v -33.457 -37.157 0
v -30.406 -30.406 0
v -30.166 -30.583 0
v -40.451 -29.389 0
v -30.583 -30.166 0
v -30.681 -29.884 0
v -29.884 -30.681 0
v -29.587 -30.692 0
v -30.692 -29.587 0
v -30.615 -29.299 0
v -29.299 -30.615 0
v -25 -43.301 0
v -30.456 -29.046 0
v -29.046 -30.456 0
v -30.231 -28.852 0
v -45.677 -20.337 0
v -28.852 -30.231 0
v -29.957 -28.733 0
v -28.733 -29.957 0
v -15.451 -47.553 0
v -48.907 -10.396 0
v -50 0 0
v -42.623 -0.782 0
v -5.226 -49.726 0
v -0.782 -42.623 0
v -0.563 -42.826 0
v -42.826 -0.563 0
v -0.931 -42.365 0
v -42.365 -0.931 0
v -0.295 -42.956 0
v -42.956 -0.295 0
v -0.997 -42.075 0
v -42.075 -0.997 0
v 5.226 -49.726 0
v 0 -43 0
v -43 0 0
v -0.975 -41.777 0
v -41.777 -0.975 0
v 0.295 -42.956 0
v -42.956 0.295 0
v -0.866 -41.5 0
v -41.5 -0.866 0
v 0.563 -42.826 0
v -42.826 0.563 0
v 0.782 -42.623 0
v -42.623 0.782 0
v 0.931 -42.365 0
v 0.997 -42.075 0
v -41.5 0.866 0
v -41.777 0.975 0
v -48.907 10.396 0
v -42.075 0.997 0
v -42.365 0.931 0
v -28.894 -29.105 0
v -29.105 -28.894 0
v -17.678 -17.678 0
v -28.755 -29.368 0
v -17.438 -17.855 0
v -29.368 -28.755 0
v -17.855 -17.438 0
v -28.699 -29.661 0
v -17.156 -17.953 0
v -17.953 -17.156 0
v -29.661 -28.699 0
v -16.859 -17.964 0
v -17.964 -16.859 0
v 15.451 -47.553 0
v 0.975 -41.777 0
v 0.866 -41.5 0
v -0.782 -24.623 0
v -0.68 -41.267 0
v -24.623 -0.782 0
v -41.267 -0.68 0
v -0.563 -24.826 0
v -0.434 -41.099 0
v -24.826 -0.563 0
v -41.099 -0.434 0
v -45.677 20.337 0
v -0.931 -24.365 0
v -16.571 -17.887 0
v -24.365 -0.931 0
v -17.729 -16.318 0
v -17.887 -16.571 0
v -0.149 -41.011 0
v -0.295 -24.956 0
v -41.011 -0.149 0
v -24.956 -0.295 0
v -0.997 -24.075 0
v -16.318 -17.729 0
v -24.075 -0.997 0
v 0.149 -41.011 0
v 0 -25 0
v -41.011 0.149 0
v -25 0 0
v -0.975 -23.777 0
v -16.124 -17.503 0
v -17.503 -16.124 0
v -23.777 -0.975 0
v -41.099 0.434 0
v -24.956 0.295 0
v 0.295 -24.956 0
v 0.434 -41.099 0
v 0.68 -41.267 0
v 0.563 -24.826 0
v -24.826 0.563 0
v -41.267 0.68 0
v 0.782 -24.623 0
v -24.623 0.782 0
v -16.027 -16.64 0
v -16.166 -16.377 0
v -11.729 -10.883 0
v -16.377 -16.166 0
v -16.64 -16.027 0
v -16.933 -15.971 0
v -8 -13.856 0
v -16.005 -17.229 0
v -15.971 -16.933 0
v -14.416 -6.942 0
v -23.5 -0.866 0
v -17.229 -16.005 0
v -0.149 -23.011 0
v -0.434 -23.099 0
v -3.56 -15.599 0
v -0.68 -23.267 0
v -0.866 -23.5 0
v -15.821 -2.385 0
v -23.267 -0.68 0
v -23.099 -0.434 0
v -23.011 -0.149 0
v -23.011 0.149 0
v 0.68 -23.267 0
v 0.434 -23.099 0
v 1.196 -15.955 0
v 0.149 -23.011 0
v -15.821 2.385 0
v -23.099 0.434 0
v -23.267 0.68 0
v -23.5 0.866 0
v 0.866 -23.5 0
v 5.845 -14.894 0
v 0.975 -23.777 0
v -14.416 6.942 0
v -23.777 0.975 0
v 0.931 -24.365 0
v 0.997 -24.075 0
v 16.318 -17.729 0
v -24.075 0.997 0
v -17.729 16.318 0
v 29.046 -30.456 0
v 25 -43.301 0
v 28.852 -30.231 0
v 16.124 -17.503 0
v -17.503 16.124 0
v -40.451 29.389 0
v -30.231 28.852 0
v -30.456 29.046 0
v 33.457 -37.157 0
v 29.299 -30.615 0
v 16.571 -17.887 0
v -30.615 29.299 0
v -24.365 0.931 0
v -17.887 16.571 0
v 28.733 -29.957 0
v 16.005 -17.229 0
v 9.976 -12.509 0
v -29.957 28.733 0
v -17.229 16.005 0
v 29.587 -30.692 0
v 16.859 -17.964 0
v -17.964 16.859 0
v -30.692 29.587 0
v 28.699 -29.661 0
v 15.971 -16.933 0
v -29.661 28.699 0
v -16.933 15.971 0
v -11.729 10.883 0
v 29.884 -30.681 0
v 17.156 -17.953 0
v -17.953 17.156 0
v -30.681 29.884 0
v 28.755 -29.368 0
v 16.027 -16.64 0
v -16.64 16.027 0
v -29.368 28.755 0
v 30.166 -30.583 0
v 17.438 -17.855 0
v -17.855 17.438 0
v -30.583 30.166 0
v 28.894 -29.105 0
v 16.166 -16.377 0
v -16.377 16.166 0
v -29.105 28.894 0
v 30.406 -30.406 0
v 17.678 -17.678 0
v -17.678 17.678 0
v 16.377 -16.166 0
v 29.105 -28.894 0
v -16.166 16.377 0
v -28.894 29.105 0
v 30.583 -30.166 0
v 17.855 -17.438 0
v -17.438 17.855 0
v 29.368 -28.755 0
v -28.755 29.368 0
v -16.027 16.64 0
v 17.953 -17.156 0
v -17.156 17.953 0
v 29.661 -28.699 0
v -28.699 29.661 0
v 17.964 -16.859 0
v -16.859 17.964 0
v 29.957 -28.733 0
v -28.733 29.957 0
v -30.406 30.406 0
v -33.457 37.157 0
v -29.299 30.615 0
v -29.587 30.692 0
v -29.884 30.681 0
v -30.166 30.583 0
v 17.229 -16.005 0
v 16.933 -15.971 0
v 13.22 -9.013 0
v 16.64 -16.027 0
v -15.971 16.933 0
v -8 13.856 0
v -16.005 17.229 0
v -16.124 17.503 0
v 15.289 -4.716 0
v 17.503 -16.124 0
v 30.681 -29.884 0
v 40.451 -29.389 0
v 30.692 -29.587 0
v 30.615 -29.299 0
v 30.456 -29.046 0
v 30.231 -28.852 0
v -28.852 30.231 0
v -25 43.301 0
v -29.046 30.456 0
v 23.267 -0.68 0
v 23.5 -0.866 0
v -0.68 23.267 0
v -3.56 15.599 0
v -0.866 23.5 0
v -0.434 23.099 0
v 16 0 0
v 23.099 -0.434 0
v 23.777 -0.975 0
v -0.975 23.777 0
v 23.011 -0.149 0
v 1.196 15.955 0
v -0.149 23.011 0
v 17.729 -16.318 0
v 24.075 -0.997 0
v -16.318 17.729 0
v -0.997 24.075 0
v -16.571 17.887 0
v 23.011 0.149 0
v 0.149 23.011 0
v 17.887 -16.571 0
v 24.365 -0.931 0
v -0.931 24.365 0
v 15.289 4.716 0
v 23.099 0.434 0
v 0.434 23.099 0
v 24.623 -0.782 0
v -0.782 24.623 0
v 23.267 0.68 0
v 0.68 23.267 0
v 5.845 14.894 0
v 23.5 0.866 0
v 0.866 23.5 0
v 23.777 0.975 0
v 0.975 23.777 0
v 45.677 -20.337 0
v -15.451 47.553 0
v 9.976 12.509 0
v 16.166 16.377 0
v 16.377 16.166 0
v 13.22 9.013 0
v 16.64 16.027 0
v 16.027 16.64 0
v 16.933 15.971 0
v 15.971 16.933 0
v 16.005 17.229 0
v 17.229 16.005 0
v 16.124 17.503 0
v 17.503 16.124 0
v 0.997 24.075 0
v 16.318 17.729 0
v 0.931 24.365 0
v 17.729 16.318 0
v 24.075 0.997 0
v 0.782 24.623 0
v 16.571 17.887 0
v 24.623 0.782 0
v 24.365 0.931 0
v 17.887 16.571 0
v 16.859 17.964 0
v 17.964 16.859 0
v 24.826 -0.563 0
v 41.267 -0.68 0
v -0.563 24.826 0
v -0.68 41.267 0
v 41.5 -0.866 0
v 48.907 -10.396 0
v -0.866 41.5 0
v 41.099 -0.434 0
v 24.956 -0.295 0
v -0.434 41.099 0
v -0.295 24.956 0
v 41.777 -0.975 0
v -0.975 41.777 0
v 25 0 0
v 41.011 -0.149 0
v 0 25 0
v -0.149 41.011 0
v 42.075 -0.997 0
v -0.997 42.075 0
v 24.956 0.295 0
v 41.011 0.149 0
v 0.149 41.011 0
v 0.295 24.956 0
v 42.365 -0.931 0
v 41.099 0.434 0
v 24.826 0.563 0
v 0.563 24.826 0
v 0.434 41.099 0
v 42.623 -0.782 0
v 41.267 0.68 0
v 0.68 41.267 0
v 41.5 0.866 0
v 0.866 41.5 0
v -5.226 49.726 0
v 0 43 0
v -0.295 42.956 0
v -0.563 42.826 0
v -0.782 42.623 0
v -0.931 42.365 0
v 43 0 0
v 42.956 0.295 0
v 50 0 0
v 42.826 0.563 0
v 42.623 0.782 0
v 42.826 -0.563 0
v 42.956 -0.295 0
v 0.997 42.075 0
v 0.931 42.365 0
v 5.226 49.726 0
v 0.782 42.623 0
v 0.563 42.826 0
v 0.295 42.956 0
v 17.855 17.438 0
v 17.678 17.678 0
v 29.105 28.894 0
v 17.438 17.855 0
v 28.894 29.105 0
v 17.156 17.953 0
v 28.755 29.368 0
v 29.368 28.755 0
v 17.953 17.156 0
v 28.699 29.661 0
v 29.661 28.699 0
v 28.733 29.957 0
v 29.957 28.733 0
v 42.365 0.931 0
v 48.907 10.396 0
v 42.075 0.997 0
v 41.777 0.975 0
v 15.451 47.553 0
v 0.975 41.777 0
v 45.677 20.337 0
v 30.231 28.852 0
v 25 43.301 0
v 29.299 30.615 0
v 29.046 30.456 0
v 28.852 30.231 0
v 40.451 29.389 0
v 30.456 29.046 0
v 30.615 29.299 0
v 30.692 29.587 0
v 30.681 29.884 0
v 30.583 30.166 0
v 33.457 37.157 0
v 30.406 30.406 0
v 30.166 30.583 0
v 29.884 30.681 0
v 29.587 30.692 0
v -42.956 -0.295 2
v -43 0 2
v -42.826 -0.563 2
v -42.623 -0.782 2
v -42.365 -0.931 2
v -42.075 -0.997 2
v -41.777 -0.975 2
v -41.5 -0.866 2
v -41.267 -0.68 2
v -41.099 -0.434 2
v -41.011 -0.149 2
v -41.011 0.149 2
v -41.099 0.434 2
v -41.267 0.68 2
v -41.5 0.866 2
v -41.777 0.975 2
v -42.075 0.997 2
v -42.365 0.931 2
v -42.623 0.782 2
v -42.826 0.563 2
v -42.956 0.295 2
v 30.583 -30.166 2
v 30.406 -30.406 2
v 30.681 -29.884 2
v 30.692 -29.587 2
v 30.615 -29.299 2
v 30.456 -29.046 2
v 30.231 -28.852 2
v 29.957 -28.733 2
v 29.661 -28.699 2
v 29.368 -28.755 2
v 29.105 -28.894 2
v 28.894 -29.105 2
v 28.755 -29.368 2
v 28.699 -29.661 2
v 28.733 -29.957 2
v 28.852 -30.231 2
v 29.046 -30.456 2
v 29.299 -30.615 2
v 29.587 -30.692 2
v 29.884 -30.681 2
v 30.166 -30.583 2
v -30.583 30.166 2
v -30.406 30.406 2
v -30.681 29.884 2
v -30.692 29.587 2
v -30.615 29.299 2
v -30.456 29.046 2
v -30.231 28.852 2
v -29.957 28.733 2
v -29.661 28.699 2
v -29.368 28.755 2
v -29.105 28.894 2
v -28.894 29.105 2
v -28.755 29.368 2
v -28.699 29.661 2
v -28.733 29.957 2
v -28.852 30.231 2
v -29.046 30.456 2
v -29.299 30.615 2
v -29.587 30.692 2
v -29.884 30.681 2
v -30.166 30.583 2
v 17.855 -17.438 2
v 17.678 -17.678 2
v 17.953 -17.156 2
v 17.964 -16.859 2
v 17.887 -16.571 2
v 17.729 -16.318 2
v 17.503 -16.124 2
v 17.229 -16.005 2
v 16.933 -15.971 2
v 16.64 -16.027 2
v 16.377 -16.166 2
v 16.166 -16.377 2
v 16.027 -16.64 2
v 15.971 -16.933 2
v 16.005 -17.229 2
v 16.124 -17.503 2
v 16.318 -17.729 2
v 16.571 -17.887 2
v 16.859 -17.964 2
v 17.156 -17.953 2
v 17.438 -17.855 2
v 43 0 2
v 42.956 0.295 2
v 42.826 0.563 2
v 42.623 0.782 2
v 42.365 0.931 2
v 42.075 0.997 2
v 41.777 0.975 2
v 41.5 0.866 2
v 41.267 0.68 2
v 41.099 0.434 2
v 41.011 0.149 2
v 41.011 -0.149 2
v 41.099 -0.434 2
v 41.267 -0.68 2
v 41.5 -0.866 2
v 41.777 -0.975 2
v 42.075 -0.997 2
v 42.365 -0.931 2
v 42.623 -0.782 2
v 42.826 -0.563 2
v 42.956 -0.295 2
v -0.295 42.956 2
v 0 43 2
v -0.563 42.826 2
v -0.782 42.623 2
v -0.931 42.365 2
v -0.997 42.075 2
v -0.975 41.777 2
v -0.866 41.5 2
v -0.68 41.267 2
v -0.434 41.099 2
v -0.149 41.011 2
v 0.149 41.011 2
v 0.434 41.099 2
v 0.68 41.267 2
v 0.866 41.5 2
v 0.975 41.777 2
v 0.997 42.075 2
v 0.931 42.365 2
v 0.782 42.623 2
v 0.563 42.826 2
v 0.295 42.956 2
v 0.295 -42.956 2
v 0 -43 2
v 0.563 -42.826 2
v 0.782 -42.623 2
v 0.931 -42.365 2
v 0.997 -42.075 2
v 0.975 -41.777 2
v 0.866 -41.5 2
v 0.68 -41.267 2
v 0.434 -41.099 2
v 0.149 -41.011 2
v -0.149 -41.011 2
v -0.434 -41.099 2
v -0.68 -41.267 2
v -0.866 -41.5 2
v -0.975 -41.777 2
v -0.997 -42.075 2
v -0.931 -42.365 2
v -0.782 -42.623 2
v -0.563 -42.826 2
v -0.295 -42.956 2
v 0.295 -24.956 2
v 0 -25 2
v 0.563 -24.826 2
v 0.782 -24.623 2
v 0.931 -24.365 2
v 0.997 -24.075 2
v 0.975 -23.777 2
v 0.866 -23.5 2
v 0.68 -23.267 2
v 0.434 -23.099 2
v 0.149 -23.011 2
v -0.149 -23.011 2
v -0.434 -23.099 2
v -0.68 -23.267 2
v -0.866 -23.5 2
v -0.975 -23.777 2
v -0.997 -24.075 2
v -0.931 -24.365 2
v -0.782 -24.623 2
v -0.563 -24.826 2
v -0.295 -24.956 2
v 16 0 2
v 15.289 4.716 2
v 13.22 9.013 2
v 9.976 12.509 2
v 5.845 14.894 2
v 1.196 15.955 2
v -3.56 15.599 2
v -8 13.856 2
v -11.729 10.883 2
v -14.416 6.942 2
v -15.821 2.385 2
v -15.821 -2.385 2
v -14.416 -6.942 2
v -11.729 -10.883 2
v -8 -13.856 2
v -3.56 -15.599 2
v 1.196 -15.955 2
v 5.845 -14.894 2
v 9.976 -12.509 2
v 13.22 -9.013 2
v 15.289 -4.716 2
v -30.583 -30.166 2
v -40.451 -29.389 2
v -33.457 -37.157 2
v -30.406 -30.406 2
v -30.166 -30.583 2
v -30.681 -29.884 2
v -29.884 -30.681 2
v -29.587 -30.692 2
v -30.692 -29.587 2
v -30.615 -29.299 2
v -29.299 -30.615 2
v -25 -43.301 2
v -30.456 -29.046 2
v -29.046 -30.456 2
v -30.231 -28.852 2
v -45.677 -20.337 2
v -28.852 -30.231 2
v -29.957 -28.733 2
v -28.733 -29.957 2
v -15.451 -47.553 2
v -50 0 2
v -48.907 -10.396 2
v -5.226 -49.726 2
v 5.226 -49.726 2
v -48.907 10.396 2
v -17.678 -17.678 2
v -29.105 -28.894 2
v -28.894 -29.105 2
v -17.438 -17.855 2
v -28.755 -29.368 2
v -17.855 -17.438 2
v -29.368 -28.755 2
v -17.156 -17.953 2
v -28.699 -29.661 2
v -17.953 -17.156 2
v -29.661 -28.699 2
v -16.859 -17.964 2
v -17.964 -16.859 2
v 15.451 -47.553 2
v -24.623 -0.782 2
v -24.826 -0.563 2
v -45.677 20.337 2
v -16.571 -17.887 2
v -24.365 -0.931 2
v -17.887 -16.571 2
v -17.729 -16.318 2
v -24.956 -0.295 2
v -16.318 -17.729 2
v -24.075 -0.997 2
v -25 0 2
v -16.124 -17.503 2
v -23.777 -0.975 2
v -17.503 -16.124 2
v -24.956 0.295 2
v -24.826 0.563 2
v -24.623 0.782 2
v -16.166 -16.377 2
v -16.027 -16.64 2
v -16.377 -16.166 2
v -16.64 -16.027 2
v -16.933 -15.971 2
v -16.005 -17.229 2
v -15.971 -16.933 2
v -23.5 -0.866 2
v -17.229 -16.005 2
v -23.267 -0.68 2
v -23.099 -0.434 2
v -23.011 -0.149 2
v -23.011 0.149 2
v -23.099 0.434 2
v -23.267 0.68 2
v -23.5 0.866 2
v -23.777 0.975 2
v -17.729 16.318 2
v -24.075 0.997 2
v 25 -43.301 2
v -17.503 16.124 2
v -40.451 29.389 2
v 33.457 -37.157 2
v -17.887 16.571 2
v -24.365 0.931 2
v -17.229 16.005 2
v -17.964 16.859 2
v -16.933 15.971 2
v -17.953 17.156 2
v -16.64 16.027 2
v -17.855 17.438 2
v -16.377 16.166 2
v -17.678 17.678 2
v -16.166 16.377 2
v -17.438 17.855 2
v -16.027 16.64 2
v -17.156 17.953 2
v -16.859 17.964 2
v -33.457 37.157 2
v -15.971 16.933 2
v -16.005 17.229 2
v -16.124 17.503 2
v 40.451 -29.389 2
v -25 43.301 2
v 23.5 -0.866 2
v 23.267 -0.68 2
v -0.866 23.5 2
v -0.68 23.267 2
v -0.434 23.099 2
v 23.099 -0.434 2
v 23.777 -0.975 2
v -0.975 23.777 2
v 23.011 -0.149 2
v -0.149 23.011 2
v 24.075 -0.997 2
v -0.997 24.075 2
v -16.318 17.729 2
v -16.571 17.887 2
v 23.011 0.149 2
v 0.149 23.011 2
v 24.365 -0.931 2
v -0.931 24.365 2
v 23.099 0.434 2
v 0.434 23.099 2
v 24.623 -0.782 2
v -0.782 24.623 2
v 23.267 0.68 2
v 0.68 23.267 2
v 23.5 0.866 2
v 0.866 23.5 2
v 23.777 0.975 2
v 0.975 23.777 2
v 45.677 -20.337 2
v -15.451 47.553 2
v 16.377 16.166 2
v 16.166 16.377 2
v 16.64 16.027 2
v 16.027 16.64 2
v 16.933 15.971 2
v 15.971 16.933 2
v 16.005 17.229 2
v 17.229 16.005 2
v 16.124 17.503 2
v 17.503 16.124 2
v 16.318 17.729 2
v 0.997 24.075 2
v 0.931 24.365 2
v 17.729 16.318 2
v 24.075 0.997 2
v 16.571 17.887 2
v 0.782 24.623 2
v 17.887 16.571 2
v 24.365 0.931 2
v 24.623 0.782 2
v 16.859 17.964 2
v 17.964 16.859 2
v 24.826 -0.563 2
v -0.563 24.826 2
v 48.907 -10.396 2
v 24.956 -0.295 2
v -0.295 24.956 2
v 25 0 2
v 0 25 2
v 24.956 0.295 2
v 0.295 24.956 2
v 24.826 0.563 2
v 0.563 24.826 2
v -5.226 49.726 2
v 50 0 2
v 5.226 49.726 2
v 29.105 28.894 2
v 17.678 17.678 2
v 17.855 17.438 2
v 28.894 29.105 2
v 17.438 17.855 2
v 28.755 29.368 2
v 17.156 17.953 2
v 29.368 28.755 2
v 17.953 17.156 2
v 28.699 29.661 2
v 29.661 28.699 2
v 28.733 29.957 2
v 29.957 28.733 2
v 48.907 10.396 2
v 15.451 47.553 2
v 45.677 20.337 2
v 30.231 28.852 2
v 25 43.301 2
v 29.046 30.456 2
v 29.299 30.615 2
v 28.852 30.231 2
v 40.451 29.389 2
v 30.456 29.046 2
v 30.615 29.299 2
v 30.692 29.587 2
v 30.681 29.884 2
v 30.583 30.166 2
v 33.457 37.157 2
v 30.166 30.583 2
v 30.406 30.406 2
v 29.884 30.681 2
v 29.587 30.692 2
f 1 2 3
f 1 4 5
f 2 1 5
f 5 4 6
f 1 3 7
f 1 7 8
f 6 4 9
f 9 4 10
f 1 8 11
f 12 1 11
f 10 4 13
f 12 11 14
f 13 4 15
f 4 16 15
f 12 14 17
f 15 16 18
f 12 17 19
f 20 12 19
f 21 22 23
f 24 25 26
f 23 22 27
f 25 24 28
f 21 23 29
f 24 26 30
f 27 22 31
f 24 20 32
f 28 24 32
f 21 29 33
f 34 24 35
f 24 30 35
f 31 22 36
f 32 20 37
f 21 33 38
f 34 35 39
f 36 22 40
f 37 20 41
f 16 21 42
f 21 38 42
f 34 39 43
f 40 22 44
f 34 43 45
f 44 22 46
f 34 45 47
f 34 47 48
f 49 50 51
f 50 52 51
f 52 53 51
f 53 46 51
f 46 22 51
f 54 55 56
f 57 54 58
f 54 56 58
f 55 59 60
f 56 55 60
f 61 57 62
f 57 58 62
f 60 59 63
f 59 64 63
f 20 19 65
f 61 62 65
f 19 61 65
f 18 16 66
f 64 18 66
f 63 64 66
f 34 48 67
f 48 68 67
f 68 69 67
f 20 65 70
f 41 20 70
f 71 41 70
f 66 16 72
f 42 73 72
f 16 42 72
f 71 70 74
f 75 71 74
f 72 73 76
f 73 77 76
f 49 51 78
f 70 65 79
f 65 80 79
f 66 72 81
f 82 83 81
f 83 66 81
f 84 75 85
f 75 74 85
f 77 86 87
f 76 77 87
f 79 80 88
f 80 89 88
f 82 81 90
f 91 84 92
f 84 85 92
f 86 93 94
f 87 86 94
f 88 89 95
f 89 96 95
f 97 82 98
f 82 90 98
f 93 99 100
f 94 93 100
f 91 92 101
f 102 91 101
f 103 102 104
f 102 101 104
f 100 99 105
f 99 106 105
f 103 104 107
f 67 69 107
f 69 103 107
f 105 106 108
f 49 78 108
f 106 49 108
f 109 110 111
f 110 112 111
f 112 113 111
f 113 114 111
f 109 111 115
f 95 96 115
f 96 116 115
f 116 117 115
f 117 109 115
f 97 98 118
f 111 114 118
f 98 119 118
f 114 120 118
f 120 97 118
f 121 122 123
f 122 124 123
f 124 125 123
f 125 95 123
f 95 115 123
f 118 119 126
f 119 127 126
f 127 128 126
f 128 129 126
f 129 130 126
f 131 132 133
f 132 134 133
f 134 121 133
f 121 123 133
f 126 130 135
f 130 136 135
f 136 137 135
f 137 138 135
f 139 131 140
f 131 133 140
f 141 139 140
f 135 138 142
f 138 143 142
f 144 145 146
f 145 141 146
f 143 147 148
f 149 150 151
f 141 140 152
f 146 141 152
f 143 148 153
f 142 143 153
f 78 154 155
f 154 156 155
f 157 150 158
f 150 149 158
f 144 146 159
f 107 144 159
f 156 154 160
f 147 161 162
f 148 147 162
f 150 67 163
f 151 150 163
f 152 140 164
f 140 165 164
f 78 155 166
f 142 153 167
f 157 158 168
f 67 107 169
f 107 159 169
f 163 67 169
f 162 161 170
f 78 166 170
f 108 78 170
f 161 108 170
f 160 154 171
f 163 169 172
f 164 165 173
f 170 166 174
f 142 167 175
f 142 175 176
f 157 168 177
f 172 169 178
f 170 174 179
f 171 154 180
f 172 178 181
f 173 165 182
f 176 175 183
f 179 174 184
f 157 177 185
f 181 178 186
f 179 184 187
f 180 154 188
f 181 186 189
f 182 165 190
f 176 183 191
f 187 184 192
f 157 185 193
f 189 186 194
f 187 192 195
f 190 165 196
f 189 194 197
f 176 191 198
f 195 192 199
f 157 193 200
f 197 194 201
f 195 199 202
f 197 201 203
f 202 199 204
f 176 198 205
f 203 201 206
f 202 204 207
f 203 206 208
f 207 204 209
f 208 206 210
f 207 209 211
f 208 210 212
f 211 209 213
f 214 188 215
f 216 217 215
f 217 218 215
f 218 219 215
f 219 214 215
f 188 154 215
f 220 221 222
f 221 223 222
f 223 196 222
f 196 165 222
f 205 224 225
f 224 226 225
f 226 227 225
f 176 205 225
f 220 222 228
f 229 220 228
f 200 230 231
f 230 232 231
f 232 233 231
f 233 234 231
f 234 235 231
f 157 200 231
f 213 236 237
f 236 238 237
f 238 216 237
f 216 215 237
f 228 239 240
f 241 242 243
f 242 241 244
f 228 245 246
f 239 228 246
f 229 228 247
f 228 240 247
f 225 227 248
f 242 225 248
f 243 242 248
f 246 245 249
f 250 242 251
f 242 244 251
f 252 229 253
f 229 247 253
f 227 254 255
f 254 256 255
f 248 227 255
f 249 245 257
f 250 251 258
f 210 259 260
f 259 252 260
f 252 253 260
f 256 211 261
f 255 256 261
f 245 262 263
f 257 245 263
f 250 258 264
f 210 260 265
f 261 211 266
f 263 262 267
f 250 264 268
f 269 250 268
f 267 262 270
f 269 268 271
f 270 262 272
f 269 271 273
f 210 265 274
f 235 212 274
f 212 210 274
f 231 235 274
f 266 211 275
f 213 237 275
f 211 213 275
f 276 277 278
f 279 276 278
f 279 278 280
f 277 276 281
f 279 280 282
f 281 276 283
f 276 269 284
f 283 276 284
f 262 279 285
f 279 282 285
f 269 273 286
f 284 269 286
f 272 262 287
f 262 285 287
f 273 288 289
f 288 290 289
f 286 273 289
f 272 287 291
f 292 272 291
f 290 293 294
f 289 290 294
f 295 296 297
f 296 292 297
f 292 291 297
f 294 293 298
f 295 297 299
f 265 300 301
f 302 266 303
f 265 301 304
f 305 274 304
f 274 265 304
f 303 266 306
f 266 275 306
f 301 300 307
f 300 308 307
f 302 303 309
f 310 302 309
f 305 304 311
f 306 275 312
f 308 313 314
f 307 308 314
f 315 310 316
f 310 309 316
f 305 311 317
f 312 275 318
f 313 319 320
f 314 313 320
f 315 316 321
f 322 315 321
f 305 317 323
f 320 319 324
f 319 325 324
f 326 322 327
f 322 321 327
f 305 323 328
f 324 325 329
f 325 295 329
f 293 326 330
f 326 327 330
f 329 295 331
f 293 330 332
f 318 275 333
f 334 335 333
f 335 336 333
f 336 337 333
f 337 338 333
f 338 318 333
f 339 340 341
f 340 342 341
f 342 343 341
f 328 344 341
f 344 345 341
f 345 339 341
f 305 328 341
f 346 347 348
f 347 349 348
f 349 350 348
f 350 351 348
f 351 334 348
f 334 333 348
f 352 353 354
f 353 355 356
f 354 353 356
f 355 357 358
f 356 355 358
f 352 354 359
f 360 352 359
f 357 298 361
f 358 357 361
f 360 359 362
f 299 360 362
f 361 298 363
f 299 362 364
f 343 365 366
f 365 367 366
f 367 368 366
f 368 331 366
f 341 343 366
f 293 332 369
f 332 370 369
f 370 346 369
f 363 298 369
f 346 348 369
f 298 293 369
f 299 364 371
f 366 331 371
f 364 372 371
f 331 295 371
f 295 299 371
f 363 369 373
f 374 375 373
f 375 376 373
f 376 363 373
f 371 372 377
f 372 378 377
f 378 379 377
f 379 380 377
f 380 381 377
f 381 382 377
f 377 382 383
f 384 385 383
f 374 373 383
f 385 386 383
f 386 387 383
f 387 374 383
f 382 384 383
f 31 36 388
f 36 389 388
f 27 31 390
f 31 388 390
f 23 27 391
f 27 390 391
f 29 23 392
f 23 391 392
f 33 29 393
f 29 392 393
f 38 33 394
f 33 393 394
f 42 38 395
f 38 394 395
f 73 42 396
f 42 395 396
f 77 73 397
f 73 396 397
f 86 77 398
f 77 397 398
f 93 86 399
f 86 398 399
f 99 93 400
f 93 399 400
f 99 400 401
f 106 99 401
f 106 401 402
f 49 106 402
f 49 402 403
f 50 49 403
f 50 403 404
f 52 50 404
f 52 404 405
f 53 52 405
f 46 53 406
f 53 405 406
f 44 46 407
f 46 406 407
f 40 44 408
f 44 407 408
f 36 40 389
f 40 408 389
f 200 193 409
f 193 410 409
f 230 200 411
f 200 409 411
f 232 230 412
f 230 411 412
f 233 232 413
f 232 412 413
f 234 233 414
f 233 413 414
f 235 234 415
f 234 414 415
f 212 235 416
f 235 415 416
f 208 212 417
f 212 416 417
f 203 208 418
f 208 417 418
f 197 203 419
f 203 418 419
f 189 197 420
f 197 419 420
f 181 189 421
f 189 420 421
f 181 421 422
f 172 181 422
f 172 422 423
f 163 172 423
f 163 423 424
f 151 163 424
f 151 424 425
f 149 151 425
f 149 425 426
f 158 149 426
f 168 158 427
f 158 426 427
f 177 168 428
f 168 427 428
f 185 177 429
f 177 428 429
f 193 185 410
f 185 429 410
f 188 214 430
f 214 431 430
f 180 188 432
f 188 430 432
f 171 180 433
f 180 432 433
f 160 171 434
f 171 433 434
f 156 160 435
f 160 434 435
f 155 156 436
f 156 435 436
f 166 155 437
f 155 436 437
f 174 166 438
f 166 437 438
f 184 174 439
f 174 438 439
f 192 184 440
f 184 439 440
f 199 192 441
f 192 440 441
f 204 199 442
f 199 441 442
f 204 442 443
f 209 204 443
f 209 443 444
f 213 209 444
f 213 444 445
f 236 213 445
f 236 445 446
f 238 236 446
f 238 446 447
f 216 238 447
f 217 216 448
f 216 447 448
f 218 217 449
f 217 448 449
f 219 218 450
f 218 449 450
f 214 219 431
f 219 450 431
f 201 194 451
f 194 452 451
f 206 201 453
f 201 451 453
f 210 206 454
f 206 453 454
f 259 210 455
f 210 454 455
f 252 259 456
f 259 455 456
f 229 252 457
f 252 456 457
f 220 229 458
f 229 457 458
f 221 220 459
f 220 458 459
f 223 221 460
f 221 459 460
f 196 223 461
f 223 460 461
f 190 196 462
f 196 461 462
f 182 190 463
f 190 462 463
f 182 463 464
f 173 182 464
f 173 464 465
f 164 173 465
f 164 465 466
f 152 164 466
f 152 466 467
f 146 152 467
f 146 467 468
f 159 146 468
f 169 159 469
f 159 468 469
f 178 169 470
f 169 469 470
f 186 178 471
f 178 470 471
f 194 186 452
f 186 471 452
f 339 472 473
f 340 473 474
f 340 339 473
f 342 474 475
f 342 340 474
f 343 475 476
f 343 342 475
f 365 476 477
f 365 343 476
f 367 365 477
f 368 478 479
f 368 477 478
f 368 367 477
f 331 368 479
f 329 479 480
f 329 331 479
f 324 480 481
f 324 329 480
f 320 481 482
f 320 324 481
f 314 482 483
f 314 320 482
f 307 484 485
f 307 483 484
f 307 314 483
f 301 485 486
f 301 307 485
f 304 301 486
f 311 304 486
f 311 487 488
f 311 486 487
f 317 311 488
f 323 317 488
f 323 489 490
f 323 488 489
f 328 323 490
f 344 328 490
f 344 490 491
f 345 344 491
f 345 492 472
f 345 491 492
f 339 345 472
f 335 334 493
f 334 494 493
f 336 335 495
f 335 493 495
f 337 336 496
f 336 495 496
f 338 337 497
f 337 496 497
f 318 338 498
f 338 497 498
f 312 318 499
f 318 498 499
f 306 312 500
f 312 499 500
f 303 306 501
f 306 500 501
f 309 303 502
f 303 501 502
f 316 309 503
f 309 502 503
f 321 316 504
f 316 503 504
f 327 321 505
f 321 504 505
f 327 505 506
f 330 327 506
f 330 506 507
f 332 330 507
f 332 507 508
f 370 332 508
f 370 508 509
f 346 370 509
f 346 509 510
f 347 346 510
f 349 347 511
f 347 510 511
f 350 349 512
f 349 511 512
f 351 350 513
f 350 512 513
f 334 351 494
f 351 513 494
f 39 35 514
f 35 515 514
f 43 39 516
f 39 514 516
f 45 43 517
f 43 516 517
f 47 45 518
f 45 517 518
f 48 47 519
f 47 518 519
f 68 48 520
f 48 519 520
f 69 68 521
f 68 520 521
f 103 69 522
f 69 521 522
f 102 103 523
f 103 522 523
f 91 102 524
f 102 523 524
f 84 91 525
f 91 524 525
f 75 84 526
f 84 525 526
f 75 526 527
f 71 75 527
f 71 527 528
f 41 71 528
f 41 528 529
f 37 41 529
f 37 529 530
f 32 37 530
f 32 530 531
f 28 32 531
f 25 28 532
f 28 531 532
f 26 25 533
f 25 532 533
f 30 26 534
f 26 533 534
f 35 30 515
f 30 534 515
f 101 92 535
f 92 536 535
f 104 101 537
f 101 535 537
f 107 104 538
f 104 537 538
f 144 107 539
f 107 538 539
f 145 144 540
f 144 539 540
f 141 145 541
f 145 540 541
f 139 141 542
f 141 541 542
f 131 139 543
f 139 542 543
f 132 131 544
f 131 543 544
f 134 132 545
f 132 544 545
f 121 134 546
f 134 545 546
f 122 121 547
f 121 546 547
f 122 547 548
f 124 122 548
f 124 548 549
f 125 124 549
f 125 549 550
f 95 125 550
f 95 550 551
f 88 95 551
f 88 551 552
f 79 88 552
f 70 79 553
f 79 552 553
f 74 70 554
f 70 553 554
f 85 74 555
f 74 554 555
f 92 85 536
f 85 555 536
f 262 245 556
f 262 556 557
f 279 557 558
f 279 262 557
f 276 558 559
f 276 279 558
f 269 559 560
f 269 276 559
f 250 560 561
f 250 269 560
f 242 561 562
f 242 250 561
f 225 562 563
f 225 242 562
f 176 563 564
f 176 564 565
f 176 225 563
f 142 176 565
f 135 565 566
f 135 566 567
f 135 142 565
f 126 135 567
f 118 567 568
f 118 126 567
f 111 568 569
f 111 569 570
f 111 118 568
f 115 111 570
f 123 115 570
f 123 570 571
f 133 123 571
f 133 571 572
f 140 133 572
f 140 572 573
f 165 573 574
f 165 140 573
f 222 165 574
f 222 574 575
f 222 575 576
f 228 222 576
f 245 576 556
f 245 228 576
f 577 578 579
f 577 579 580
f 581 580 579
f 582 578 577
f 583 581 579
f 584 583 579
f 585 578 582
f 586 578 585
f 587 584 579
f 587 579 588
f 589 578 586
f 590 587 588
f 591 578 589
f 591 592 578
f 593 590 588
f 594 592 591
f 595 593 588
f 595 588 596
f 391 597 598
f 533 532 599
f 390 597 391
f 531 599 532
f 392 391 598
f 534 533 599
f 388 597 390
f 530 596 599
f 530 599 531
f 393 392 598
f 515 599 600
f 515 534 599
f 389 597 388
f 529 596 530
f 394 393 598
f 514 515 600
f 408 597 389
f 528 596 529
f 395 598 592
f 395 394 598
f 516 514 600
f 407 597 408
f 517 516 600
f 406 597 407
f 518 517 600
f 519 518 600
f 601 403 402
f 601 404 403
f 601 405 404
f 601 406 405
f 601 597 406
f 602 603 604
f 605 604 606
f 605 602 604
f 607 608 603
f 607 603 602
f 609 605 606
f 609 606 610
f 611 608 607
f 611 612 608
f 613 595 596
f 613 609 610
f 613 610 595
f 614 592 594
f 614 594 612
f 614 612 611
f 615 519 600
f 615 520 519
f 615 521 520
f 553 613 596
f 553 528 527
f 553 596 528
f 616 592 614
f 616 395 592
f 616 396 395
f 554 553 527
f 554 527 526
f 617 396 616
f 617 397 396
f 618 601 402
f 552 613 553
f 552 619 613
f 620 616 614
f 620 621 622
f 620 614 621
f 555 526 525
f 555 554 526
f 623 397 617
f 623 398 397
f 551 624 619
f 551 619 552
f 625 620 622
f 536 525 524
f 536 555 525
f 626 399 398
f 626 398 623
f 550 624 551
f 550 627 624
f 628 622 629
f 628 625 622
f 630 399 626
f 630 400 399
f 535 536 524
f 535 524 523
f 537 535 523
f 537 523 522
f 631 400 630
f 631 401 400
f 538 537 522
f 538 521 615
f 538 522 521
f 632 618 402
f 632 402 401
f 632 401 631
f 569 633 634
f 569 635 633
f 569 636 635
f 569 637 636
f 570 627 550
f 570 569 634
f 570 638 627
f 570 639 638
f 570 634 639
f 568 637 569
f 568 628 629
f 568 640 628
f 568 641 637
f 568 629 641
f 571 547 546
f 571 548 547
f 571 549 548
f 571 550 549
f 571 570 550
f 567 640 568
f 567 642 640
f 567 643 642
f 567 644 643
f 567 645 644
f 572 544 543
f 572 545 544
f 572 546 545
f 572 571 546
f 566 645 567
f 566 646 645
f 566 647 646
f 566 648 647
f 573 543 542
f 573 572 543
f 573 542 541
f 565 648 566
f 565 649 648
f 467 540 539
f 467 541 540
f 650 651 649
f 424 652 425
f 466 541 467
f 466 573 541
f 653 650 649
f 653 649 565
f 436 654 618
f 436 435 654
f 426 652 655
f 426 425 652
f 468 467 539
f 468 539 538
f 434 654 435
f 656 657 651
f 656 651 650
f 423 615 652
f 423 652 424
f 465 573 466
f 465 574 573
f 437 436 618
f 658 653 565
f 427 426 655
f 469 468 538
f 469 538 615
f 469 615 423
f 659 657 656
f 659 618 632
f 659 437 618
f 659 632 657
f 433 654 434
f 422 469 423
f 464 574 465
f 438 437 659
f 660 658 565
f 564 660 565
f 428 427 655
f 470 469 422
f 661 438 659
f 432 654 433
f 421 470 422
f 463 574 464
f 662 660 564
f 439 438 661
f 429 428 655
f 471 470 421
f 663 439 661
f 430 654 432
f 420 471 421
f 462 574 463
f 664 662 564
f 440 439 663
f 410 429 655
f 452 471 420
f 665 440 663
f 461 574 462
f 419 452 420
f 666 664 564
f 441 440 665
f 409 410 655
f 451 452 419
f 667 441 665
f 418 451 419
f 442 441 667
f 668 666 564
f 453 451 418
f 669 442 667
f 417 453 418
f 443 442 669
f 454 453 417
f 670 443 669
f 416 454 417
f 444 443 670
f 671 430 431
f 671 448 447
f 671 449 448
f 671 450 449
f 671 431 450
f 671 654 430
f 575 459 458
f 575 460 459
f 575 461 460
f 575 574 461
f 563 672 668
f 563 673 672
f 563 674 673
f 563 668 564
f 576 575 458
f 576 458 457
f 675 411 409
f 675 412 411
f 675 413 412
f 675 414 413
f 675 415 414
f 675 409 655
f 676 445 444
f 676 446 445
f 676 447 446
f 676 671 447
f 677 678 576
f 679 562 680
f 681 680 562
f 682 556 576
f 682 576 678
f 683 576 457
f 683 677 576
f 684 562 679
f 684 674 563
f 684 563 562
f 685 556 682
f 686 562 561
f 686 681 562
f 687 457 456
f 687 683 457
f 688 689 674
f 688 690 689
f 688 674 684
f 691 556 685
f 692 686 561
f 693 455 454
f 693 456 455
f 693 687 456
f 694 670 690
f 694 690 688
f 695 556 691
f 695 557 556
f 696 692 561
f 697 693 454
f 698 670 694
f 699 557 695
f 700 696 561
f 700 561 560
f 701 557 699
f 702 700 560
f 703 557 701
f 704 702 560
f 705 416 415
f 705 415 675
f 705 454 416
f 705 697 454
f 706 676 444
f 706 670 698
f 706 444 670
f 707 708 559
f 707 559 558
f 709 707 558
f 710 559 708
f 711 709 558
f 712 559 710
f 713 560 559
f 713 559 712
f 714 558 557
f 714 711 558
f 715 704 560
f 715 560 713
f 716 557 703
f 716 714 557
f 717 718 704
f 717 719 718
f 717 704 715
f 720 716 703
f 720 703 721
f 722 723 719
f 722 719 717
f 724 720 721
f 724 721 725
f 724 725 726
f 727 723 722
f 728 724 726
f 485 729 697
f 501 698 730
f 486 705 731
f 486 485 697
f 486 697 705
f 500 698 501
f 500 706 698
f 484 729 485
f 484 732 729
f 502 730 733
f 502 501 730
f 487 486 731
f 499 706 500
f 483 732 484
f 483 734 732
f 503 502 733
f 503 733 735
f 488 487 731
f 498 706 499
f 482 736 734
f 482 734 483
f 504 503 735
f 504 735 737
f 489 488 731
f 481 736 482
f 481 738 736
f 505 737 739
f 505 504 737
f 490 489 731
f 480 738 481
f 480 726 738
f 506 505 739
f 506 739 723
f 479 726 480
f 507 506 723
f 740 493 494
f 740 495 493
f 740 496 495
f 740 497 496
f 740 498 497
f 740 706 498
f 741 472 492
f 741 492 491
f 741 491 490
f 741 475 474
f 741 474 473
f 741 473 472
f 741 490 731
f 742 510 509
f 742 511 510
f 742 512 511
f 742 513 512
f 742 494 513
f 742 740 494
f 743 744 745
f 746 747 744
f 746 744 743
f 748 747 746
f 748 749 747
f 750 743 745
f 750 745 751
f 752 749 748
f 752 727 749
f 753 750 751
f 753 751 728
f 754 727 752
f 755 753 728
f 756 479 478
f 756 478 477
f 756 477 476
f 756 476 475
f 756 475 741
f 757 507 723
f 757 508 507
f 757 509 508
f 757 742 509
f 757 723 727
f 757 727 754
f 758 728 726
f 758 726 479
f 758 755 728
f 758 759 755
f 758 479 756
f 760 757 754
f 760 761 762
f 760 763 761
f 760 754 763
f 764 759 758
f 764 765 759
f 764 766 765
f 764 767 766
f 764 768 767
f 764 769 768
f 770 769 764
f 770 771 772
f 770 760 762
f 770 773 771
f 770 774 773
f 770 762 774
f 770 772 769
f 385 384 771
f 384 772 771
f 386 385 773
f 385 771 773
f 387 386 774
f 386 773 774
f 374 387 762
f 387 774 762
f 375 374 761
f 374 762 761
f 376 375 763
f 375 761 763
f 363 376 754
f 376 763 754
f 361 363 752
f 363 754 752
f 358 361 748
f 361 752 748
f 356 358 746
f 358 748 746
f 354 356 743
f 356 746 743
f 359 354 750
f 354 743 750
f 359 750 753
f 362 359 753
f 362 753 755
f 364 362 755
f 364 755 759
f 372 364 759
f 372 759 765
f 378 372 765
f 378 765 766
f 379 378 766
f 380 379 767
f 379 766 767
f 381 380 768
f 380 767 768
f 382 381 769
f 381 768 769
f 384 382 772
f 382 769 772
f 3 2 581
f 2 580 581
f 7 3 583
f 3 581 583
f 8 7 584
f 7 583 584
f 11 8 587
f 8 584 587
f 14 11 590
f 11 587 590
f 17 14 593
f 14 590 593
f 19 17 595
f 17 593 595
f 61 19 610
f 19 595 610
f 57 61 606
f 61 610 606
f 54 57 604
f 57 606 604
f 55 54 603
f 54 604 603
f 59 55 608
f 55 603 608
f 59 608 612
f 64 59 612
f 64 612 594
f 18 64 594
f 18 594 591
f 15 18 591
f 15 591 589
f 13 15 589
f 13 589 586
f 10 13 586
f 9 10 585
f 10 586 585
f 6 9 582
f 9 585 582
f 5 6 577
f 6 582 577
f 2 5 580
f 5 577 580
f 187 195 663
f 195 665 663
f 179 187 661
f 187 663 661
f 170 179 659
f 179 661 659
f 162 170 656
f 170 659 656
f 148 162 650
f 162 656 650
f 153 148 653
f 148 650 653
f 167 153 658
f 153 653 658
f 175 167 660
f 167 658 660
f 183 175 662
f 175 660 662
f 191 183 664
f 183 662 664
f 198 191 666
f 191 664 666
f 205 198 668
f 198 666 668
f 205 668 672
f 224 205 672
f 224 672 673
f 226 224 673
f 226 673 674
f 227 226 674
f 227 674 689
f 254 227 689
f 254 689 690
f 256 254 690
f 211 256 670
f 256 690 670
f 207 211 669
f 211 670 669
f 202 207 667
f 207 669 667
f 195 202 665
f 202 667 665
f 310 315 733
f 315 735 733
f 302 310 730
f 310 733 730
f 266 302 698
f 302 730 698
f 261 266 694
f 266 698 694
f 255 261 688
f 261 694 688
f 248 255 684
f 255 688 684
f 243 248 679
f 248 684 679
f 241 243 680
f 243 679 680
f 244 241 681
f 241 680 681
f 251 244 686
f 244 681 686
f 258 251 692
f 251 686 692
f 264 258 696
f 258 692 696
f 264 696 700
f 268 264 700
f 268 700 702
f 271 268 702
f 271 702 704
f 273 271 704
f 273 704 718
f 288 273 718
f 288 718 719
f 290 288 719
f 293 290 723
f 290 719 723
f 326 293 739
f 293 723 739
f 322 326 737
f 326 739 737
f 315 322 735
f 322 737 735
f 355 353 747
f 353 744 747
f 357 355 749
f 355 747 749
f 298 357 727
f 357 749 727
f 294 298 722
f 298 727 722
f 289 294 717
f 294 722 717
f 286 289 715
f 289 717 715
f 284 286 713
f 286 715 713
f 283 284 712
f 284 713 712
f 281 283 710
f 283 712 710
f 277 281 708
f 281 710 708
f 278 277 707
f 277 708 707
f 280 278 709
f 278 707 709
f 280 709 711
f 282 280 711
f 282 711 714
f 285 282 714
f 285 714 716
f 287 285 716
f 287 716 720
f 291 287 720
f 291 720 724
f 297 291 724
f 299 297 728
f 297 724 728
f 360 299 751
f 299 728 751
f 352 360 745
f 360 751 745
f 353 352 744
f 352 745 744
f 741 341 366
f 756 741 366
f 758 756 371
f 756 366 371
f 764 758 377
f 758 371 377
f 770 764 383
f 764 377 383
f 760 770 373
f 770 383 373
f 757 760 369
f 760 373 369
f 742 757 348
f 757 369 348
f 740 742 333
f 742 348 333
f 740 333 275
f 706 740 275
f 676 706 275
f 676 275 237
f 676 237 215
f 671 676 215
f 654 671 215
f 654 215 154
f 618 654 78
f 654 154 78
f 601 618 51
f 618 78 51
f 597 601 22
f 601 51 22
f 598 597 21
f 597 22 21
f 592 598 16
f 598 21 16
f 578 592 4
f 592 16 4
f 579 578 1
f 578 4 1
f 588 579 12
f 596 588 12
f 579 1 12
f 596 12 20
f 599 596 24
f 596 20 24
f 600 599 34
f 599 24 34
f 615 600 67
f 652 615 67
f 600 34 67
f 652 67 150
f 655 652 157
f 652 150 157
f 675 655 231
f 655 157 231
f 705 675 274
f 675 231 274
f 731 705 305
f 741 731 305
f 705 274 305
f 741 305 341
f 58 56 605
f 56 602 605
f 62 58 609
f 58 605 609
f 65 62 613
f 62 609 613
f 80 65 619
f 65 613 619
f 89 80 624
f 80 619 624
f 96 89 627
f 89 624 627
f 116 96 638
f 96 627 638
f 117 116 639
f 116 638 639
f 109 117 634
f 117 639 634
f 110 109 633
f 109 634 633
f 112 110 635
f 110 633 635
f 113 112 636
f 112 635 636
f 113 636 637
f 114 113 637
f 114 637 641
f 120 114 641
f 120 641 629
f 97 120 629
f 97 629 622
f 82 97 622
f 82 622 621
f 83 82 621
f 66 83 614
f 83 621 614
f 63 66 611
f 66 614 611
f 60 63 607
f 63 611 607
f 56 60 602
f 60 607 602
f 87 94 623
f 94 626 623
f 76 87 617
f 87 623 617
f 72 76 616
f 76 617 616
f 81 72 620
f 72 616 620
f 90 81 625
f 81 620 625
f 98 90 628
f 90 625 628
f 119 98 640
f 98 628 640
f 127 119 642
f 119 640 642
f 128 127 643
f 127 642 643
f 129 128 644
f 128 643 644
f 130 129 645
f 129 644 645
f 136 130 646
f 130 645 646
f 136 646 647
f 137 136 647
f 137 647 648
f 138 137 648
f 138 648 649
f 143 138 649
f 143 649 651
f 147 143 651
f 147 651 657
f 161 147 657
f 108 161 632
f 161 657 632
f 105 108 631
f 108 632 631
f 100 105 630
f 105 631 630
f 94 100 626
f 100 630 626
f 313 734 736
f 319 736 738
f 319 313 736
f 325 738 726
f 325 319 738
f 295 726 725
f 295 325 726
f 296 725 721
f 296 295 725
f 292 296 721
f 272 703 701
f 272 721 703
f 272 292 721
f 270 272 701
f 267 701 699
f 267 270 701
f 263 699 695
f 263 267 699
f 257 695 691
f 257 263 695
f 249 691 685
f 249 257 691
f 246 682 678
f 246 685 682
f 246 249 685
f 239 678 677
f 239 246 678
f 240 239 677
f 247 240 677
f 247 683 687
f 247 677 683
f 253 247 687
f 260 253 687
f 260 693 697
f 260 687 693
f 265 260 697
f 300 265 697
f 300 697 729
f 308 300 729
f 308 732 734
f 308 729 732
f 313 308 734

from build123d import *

# Parameters (mm, degrees)
SKETCH_R           = 50
SKETCH_R_2         = 16
PAD_DEPTH          = 2
SKETCH001_R        = 1
POCKET_DEPTH       = 282.871995
POCKET_DEPTH_BACK  = 284.871995
POLARPATTERN_COUNT = 8


with BuildPart() as part:
    # Sketch → Pad (new body)
    with BuildSketch(Plane.XY):
        Circle(SKETCH_R)
        Circle(SKETCH_R_2, mode=Mode.SUBTRACT)
    extrude(amount=PAD_DEPTH)

    # Sketch001 → Pocket (cut, two sides)
    with BuildSketch(Plane.XY) as pocket_sk:
        with Locations((24, 0)):
            Circle(SKETCH001_R)
        with Locations((42, 0)):
            Circle(SKETCH001_R)
    pocket = extrude(amount=-POCKET_DEPTH, mode=Mode.SUBTRACT) + extrude(pocket_sk.sketch, amount=POCKET_DEPTH_BACK, mode=Mode.SUBTRACT)

    # PolarPattern: Pocket ×8 about axis
    polarpattern_axis = Axis((0, 0, 0), (0, 0, 1))
    for i in range(1, POLARPATTERN_COUNT):
        add(pocket.rotate(polarpattern_axis, i * 360 / POLARPATTERN_COUNT), mode=Mode.SUBTRACT)


solid = part.part
